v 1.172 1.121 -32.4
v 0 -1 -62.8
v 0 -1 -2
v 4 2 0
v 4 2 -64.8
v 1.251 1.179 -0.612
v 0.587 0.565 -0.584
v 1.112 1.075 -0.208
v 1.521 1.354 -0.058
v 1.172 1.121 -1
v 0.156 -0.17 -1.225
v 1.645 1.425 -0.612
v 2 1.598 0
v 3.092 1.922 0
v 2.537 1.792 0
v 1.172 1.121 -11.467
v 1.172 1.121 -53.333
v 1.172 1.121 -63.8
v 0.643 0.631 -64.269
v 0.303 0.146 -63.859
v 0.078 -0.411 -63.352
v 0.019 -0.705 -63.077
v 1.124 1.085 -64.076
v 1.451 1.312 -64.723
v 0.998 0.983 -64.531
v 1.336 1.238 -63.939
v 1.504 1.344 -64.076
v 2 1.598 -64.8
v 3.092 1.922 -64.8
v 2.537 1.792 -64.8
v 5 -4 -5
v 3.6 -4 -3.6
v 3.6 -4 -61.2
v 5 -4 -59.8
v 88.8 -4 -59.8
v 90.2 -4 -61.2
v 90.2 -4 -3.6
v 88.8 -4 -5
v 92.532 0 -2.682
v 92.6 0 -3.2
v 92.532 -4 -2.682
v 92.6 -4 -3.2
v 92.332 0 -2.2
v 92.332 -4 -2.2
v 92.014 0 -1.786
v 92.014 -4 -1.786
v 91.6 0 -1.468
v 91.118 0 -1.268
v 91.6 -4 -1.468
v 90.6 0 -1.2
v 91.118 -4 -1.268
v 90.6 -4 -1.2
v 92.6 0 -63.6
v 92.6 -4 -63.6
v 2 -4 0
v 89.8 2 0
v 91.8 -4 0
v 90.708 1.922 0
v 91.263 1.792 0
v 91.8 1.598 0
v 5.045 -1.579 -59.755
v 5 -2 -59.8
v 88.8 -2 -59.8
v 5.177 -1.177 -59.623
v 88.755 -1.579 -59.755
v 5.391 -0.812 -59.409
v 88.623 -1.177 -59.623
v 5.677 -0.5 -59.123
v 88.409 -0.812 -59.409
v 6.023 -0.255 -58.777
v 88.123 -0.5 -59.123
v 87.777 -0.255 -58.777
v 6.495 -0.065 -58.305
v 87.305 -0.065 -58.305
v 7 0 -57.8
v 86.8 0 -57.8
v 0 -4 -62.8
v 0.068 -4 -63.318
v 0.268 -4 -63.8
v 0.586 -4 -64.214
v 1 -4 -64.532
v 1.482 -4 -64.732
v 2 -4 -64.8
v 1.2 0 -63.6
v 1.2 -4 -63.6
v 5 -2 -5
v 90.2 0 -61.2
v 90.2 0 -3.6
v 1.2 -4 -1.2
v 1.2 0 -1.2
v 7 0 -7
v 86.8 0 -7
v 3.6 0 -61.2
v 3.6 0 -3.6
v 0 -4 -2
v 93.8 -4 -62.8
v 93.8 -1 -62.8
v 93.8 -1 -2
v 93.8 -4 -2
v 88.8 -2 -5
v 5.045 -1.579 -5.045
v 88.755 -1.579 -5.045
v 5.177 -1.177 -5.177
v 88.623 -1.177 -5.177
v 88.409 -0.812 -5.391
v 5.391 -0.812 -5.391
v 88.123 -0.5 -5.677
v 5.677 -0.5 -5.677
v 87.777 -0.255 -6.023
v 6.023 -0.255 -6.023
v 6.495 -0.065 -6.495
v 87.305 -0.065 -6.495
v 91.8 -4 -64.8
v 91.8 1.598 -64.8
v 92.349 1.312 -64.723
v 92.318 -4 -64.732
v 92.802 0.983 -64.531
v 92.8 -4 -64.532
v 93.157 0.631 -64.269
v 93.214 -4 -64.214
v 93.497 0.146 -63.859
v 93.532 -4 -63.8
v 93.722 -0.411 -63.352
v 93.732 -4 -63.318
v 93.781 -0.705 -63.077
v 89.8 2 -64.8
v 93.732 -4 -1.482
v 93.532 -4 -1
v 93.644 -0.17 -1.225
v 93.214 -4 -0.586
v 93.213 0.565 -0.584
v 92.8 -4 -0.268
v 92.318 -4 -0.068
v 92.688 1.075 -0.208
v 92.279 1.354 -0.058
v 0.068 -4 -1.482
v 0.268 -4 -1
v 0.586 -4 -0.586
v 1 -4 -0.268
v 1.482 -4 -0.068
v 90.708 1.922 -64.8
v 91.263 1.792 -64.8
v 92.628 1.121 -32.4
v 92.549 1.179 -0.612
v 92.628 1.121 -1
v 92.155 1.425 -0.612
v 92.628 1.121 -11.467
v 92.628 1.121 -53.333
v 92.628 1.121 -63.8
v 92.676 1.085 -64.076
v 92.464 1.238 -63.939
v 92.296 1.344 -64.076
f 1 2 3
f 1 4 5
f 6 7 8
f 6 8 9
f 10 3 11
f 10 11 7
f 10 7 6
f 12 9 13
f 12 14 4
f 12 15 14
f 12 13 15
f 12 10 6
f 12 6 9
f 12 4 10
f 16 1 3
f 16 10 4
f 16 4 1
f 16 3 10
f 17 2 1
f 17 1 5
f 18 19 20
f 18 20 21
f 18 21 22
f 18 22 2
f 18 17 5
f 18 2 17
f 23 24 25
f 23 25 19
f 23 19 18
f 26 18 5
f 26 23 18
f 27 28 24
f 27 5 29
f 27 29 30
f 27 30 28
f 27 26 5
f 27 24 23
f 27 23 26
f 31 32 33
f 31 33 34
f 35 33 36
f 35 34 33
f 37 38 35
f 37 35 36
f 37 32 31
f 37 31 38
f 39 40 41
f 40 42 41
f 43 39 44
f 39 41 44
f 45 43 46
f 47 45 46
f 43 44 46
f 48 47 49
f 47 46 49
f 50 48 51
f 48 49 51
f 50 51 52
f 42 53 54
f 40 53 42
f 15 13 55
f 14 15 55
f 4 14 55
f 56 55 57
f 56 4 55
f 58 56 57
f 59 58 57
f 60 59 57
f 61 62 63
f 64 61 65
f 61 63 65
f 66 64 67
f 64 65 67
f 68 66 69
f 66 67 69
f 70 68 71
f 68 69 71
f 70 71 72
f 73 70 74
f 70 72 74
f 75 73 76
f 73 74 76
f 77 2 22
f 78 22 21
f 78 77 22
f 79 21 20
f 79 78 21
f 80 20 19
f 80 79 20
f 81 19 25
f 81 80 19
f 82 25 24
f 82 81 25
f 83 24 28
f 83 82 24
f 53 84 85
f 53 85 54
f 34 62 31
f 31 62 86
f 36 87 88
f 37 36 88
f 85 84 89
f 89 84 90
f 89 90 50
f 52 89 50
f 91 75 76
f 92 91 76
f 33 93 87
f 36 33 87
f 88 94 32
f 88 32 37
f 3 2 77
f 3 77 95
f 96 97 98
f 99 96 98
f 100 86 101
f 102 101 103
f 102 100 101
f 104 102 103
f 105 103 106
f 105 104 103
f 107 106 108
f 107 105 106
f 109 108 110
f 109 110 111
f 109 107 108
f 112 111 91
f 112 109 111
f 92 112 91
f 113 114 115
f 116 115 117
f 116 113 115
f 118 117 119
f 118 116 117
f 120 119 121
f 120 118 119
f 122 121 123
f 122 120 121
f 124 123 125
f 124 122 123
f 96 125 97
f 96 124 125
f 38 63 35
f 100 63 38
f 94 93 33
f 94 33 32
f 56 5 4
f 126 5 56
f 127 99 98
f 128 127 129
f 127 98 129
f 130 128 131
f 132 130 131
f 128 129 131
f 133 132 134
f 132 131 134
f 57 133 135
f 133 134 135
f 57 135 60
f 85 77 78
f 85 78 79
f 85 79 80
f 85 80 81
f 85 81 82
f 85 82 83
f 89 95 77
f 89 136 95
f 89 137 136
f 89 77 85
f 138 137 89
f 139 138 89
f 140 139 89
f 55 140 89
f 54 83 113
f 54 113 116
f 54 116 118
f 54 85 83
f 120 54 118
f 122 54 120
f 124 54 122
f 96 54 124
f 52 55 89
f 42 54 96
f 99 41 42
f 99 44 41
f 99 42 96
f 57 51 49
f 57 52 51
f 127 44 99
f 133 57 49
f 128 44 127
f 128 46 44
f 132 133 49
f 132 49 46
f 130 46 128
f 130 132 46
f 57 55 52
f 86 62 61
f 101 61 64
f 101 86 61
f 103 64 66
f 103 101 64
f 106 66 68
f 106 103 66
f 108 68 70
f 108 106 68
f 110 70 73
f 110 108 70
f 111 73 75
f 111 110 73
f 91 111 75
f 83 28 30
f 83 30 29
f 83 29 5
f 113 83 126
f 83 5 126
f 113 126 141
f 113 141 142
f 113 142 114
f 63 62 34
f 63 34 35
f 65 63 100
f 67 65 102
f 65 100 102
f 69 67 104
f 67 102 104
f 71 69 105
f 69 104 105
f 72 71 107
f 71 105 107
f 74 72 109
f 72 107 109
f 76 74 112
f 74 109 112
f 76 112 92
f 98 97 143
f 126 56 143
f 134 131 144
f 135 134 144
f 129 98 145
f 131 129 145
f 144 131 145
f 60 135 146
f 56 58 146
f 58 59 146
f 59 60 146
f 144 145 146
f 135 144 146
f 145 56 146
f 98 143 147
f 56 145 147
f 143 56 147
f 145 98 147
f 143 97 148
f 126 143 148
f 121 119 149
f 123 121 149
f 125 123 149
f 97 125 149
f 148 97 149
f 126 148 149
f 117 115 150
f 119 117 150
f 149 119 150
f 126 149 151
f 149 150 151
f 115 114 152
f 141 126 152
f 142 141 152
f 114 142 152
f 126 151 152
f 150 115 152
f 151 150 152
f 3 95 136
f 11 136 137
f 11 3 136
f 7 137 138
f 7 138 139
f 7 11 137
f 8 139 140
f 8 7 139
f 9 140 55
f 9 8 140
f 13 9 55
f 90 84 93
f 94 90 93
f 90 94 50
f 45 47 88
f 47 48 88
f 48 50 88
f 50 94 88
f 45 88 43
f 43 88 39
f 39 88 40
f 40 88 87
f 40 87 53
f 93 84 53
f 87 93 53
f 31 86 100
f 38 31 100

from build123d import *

# Parameters (mm, degrees)
SKETCH1_W           = 93.8
SKETCH1_H           = 32.4
BOSS_EXTRUDE1_DEPTH = 2
SKETCH3_W           = 93.8
SKETCH3_H           = 64.8
SKETCH3_W_2         = 91.4
SKETCH3_H_2         = 62.4
SKETCH3_W_3         = 86.6
SKETCH3_H_3         = 57.6
SKETCH3_W_4         = 83.8
SKETCH3_H_4         = 54.8
BOSS_EXTRUDE2_DEPTH = 4
FILLET6_R           = 2
FILLET8_START       = -66
FILLET8_DEPTH       = 67
FILLET9_R           = 2
FILLET10_R          = 2


with BuildPart() as part:
    # Sketch1 → Boss-Extrude1 (new body)
    with BuildSketch(Plane(origin=(0, 0, 0), x_dir=(1, 0, 0), z_dir=(0, 1, 0))):
        with Locations((46.9, 48.6)):
            Rectangle(SKETCH1_W, SKETCH1_H)
        Polygon((93.8, 32.4), (0, 32.4), (0, 0), (42.9, 0), (50.9, 0), (93.8, 0), align=None)
    extrude(amount=BOSS_EXTRUDE1_DEPTH)

    # Sketch3 → Boss-Extrude2 (add)
    # profile 1 of 2: a face of its own
    with BuildSketch(Plane.XZ):
        with Locations((46.9, -32.4)):
            Rectangle(SKETCH3_W, SKETCH3_H)
        with Locations((46.9, -32.4)):
            Rectangle(SKETCH3_W_2, SKETCH3_H_2, mode=Mode.SUBTRACT)
    # profile 2 of 2: a face of its own
    with BuildSketch(Plane.XZ):
        with Locations((46.9, -32.4)):
            Rectangle(SKETCH3_W_3, SKETCH3_H_3)
        with Locations((46.9, -32.4)):
            Rectangle(SKETCH3_W_4, SKETCH3_H_4, mode=Mode.SUBTRACT)
    extrude(amount=BOSS_EXTRUDE2_DEPTH)

    # Fillet6
    fillet6_edges = [part.edges().sort_by_distance(p)[0] for p in [
        (0, -1, -64.8),
        (93.8, -1, -64.8),
        (93.8, -1, 0),
        (0, -1, 0),
    ]]
    fillet(fillet6_edges, radius=FILLET6_R)

    # Fillet8: read off the stored shape, not the designer's step
    # Fillet8 outline → Fillet8 (cut)
    with BuildSketch(Plane.XY.offset(FILLET8_START)):
        with BuildLine():
            add(Edge.make_bspline(
                [(0, -1), (0, 2), (4, 2)],
                knots=[0, 0, 0, 1, 1, 1], degree=2, weights=[1, 0.707106781, 1]))
            Line((4, 2), (0, 2))
            Line((0, 2), (0, -1))
        make_face()
        with BuildLine():
            add(Edge.make_bspline(
                [(93.8, -1), (93.8, 2), (89.8, 2)],
                knots=[0, 0, 0, 1, 1, 1], degree=2, weights=[1, 0.707106781, 1]))
            Line((93.8, -1), (93.8, 2))
            Line((93.8, 2), (89.8, 2))
        make_face()
    extrude(amount=FILLET8_DEPTH, mode=Mode.SUBTRACT)

    # Fillet9
    fillet9_edges = [part.edges().sort_by_distance(p)[0] for p in [
        (5, 0, -32.4),
        (46.9, 0, -5),
        (88.8, 0, -32.4),
        (46.9, 0, -59.8),
    ]]
    fillet(fillet9_edges, radius=FILLET9_R)

    # Fillet10
    fillet10_edges = [part.edges().sort_by_distance(p)[0] for p in [
        (92.6, -2, -1.2),
    ]]
    fillet(fillet10_edges, radius=FILLET10_R)


solid = part.part
